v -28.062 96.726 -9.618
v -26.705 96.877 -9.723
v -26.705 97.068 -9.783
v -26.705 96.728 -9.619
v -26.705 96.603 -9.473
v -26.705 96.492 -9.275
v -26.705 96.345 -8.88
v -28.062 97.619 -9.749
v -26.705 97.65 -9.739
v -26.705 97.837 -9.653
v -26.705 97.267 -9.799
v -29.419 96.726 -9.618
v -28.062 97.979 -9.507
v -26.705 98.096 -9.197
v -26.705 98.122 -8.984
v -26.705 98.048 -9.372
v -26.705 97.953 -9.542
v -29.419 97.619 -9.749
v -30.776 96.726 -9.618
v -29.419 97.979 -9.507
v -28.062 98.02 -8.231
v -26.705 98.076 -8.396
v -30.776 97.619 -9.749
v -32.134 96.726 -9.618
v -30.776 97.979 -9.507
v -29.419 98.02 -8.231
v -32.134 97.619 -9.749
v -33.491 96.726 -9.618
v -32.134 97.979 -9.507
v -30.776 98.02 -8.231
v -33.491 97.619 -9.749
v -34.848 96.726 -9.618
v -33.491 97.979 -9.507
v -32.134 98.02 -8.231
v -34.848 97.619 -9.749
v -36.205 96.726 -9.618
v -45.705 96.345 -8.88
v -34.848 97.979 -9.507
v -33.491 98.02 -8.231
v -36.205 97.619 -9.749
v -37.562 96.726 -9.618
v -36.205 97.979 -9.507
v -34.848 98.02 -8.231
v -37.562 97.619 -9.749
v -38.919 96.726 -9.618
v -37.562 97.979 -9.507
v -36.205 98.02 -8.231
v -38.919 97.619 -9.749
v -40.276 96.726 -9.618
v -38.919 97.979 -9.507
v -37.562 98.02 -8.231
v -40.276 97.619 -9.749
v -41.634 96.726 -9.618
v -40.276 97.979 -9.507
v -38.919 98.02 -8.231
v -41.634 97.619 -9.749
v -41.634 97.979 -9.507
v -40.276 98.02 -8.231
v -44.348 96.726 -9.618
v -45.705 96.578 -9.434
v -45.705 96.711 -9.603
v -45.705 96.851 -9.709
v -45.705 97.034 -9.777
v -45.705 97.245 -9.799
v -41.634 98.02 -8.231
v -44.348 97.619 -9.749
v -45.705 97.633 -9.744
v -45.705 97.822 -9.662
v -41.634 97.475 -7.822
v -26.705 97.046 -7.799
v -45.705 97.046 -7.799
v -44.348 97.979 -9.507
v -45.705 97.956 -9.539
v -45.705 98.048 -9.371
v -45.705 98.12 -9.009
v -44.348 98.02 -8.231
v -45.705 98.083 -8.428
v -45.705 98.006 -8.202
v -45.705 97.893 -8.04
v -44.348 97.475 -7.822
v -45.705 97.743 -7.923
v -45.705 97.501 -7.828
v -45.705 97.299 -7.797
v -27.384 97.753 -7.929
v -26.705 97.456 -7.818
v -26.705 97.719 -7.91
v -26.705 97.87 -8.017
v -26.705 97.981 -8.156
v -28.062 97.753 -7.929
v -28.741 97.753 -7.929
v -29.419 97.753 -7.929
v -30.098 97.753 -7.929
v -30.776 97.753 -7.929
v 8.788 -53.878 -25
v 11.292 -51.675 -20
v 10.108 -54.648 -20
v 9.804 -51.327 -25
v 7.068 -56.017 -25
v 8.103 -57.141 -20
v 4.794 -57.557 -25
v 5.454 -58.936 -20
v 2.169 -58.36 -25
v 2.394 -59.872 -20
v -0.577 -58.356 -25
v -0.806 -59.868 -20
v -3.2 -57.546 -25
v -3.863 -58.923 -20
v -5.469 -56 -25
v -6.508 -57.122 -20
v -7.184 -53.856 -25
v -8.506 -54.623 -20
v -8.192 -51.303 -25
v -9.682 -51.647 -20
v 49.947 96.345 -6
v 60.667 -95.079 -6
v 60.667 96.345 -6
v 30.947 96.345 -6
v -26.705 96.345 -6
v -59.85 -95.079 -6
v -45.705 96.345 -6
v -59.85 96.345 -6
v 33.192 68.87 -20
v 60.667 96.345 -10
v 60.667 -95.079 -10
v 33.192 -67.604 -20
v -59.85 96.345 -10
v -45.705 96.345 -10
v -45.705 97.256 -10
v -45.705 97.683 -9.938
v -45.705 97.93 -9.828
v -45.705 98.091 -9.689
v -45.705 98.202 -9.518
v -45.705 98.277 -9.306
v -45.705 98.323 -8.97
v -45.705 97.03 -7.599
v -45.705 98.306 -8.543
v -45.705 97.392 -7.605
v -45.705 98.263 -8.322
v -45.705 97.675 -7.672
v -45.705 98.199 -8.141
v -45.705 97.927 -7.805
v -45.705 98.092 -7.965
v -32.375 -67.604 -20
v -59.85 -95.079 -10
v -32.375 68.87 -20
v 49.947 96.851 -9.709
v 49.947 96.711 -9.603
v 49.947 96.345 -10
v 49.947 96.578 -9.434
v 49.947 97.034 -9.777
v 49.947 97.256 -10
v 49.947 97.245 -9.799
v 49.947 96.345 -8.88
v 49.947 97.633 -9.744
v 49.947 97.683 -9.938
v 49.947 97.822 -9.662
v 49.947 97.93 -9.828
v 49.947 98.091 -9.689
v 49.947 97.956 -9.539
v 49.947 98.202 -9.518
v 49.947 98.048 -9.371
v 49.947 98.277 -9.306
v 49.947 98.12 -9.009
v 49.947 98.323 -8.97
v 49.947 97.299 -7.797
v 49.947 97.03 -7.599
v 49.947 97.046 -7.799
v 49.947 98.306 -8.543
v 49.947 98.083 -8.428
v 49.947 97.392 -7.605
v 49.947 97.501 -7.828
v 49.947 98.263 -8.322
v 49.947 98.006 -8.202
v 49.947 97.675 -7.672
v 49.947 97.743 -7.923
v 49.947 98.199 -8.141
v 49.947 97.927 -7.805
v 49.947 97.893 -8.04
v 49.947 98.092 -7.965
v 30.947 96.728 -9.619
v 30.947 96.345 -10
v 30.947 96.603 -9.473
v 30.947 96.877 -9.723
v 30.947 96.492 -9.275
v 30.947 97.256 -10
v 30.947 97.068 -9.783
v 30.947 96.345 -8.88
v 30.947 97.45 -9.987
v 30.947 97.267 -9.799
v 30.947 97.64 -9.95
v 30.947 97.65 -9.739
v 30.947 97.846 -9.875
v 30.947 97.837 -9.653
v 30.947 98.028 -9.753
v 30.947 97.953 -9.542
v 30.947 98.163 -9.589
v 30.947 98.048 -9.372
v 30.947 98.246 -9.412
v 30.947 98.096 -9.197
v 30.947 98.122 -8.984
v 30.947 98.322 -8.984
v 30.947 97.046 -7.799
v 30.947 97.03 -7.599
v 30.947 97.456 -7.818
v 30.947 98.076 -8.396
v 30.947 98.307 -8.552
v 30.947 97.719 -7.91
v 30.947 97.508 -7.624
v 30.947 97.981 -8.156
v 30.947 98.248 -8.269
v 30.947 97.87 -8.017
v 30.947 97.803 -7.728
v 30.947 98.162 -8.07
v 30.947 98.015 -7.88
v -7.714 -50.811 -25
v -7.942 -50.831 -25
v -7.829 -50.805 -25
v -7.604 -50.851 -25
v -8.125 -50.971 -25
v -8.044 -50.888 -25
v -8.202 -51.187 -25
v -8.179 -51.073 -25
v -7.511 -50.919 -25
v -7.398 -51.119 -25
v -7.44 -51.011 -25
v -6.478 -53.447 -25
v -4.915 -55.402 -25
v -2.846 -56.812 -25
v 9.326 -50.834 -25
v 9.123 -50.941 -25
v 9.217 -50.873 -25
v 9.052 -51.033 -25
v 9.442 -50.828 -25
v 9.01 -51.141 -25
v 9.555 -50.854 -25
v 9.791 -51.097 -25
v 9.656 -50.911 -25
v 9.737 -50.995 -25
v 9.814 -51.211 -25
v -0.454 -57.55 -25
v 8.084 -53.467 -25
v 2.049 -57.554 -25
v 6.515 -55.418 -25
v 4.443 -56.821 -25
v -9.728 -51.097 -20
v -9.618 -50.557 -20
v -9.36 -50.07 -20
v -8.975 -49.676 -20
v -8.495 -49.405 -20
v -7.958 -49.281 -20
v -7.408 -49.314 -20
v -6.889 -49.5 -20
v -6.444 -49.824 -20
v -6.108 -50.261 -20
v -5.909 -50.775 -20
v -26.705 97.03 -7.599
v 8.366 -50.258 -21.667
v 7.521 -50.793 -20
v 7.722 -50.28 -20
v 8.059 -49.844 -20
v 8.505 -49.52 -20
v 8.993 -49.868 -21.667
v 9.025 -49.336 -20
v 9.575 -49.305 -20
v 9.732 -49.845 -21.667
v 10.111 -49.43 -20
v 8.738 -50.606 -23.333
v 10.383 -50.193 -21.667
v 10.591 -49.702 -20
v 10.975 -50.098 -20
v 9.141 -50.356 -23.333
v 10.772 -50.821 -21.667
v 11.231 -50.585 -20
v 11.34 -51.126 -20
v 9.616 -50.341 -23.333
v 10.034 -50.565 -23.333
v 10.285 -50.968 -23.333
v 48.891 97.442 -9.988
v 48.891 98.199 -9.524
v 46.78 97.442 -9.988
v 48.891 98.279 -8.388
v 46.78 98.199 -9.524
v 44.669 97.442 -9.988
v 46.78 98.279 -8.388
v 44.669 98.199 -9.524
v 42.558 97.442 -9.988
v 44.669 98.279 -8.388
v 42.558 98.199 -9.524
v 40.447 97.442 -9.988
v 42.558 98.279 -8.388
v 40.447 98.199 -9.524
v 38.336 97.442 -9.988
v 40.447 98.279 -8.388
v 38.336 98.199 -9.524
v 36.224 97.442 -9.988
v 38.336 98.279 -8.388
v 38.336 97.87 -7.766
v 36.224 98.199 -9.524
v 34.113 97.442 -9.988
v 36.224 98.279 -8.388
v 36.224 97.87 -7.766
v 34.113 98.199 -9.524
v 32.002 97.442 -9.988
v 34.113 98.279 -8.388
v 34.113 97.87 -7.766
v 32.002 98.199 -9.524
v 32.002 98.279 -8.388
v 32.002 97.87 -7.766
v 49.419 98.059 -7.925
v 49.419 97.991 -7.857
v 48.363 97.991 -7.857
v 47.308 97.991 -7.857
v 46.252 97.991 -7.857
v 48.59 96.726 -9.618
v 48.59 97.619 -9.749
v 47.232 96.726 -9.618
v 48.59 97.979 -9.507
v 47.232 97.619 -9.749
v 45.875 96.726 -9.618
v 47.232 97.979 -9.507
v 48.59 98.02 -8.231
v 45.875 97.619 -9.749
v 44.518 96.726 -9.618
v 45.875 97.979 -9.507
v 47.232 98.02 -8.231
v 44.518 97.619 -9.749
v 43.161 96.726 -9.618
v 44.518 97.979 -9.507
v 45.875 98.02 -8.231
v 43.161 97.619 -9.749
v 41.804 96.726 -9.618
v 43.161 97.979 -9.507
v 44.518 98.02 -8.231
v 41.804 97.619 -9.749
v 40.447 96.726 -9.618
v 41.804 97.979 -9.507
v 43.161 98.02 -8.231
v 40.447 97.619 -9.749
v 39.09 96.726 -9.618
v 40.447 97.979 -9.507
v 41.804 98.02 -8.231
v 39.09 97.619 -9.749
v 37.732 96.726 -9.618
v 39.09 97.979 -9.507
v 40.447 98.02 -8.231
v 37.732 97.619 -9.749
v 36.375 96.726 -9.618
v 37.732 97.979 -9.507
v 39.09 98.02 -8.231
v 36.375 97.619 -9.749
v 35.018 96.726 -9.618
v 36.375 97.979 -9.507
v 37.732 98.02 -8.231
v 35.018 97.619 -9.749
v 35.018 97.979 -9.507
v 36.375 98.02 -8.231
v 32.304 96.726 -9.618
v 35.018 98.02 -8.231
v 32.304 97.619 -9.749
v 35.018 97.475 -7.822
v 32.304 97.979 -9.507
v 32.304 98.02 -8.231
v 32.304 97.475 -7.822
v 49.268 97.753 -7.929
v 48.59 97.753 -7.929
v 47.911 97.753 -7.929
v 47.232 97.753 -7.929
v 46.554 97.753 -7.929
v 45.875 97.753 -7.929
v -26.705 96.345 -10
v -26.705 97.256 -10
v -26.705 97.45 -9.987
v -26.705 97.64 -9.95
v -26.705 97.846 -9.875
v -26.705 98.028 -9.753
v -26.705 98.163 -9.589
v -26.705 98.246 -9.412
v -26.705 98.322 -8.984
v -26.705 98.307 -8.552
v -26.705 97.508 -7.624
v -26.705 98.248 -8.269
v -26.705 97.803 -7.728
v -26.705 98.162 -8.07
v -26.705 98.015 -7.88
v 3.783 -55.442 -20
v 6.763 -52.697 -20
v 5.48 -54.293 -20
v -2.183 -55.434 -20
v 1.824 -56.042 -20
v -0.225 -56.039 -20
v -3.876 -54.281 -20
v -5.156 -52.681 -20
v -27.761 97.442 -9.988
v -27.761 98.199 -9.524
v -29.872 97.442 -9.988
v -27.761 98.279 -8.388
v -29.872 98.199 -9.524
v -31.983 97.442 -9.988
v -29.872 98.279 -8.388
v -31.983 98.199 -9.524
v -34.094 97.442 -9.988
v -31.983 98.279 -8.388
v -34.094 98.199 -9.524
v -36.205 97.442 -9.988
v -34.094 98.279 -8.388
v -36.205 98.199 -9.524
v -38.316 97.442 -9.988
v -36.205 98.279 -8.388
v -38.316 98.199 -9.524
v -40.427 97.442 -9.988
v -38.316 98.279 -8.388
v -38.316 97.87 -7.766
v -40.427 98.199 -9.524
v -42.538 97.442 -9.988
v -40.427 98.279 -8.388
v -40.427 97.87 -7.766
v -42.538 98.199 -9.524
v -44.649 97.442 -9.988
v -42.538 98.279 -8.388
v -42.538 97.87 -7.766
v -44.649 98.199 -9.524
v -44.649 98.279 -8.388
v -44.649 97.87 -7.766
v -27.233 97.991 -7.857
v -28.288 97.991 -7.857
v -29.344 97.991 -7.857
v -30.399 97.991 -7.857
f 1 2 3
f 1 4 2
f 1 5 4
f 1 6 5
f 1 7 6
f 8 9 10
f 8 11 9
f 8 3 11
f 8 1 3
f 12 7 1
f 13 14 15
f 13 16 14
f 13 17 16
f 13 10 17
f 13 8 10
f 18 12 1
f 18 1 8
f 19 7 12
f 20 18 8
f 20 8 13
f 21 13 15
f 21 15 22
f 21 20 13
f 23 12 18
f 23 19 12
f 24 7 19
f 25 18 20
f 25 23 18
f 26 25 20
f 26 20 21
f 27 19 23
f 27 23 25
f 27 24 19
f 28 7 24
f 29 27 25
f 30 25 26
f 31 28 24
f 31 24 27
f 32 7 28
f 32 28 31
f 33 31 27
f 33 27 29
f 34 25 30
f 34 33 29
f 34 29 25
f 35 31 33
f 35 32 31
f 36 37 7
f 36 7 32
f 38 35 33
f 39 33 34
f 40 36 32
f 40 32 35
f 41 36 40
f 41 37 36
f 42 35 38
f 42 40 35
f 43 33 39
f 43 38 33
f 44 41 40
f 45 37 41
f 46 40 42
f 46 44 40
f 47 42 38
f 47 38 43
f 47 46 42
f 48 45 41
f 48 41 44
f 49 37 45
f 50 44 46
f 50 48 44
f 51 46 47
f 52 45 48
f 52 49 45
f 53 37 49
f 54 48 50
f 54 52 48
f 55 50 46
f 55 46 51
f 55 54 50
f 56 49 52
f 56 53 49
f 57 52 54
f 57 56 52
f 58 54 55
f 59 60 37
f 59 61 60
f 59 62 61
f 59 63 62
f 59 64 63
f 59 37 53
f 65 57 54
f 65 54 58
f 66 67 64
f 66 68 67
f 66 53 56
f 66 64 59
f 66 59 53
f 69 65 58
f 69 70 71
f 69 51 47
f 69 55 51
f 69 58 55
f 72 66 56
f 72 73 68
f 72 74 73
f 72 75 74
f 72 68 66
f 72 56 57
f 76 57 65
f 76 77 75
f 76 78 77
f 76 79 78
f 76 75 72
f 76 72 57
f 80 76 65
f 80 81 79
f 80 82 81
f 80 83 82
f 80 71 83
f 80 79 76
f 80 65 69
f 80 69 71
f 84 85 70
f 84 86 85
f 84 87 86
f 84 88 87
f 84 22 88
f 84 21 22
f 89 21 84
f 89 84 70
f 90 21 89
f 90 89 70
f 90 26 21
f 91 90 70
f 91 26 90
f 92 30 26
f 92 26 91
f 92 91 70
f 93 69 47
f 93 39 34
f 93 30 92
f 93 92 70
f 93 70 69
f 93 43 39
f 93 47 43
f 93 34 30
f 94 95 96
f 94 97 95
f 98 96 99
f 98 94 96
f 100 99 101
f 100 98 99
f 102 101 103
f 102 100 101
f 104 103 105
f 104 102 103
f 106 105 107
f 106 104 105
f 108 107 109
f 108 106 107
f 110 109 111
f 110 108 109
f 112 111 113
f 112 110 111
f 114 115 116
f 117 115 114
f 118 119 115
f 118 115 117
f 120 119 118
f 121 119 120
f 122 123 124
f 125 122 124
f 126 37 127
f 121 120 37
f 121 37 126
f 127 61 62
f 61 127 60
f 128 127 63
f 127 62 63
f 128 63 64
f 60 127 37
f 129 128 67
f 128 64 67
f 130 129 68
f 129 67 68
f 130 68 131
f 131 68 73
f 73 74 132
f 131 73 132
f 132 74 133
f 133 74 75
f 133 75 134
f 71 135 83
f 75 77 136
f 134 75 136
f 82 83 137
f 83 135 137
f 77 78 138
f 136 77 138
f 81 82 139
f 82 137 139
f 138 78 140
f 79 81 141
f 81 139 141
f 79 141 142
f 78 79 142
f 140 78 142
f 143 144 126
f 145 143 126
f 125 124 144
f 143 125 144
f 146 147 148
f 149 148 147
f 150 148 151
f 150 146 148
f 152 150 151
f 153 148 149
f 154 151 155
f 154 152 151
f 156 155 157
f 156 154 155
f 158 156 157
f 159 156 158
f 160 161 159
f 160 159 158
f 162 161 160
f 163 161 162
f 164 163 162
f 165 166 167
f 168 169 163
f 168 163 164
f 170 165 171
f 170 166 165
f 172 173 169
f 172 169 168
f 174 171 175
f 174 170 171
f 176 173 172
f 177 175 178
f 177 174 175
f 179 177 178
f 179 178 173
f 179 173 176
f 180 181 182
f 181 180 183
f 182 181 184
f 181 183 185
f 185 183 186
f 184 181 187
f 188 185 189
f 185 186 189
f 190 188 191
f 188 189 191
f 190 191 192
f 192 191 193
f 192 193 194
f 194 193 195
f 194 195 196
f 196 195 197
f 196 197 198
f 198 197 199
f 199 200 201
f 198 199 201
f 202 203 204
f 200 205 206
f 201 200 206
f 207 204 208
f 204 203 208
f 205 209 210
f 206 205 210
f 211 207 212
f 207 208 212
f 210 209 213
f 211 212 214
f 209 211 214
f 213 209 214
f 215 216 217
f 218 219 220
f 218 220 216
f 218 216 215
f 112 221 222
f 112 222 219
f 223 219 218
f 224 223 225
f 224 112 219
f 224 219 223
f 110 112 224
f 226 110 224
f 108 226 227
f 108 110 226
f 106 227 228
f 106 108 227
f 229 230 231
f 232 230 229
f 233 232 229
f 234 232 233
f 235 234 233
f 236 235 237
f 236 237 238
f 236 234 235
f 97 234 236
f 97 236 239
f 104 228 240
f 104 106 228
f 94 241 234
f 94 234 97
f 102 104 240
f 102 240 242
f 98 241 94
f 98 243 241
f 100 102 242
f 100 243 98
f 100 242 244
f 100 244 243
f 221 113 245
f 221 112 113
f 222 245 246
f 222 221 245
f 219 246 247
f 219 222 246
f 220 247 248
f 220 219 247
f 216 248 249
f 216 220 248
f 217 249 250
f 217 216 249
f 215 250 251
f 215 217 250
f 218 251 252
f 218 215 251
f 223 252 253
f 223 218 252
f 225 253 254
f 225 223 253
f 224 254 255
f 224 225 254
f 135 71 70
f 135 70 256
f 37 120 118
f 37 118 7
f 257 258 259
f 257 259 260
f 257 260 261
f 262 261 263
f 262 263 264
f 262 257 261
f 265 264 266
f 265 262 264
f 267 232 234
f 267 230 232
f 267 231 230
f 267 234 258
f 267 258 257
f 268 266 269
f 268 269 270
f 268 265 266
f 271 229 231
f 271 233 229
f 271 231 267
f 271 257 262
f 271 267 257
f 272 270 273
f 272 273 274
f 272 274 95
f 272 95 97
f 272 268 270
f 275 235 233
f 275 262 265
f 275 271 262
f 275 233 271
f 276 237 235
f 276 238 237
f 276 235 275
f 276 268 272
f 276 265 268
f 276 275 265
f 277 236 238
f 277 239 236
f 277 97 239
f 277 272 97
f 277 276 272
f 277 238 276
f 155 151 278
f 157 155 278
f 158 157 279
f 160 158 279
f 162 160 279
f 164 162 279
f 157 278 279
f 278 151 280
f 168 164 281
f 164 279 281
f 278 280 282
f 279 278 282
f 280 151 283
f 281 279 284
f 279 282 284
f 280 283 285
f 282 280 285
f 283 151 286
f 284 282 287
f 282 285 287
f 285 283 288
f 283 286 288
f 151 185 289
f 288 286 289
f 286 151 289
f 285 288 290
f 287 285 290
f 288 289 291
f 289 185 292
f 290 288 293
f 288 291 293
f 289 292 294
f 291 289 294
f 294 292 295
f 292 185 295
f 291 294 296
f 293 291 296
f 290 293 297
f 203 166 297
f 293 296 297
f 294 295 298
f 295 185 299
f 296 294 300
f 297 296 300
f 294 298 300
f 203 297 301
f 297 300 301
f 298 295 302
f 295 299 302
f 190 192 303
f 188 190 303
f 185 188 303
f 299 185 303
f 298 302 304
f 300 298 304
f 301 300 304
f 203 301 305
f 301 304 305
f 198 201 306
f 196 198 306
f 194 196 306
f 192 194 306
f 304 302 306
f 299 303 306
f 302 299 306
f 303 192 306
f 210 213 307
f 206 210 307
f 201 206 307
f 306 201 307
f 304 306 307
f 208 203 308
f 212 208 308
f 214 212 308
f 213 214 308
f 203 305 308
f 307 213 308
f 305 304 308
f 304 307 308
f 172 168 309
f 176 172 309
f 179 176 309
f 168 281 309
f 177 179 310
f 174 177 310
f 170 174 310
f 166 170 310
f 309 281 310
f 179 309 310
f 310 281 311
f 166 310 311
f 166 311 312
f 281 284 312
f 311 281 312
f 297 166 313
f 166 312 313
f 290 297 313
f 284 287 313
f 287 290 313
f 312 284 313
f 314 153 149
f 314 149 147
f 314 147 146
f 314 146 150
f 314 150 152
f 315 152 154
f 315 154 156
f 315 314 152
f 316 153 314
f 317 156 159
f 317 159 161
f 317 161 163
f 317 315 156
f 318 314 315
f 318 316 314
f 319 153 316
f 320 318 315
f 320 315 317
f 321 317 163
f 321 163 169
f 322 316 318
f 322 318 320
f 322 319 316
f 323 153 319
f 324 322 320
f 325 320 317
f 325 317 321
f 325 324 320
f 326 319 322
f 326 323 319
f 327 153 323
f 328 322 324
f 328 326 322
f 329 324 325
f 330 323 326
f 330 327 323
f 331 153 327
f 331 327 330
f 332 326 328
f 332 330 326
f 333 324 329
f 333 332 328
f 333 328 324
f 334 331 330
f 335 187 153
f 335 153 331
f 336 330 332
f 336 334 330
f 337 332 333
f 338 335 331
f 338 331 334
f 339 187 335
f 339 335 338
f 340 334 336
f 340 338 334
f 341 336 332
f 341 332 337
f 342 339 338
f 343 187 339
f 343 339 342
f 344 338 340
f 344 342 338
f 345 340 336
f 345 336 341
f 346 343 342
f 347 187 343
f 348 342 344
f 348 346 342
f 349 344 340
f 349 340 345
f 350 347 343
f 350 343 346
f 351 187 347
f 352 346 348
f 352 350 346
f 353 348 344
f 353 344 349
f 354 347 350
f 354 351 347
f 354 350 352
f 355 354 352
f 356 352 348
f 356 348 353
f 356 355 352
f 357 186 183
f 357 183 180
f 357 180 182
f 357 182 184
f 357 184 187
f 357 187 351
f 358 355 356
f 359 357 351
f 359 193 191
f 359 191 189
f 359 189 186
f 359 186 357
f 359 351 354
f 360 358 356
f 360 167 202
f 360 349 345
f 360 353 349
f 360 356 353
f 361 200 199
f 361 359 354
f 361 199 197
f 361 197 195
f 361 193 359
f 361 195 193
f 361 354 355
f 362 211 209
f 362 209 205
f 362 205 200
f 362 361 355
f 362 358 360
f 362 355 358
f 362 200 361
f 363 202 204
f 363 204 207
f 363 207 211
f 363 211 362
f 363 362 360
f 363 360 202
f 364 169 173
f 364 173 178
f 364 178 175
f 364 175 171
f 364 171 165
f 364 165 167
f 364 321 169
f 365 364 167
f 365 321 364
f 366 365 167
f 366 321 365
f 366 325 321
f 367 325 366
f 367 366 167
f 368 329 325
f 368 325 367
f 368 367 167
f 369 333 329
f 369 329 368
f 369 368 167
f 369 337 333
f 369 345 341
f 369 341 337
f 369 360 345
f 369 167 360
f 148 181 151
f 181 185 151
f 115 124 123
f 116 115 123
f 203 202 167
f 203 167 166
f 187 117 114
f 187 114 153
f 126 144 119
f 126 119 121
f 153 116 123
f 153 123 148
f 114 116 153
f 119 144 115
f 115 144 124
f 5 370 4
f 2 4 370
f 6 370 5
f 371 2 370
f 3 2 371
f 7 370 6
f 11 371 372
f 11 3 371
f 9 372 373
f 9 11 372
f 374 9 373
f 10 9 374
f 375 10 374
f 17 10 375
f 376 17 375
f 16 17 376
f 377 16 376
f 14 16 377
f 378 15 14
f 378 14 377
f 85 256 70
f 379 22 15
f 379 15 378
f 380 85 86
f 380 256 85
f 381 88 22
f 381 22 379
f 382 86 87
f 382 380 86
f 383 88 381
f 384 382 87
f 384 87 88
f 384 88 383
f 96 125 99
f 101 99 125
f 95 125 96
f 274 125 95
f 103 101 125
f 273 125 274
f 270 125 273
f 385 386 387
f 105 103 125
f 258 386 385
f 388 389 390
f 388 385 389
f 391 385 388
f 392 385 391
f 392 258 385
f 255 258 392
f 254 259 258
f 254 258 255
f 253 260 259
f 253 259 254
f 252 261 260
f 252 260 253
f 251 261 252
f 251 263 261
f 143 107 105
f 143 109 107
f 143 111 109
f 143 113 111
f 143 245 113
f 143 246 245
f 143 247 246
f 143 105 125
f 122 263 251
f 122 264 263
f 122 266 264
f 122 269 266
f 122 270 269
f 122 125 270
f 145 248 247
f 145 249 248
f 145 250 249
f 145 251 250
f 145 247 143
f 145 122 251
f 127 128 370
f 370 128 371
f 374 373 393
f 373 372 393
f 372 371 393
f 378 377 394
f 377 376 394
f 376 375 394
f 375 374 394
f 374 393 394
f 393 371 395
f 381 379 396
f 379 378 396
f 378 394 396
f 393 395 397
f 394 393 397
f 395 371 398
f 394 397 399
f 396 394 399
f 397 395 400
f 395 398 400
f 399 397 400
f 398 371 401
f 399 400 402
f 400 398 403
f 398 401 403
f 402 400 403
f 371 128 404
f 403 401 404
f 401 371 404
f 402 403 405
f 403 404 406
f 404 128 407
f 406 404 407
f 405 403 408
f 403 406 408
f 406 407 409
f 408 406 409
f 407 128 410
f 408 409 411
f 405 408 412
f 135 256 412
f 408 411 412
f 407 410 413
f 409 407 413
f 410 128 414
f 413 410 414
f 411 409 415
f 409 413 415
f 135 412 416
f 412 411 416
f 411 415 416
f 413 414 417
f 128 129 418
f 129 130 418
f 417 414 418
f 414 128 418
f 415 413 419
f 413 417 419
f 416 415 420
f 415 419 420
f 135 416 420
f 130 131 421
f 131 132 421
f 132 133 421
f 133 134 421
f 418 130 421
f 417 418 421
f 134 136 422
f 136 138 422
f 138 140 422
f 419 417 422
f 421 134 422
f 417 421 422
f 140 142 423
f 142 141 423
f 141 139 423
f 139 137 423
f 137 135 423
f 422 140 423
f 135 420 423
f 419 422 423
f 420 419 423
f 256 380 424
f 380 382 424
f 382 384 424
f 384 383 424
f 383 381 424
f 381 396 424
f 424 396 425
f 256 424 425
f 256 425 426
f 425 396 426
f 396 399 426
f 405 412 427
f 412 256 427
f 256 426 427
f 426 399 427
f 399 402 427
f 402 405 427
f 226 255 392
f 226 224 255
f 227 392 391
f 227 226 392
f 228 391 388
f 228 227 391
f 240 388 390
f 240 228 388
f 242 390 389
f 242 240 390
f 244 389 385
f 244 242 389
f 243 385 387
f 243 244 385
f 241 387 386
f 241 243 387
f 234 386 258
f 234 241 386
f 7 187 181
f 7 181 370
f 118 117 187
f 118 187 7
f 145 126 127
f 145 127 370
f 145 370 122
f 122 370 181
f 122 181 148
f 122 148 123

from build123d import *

# Parameters (mm, degrees)
BOSS_EXTRUDE2_DEPTH      = 5
BOSS_EXTRUDE2_DEPTH_BACK = 10
SKETCH1_W                = 120.517011816
SKETCH1_H                = 193.423301164
CUT_EXTRUDE1_DEPTH       = 117.520998071
CUT_EXTRUDE1_DEPTH_BACK  = 117.520998071
SKETCH2_W                = 10.720124134
SKETCH2_H                = 2
SKETCH2_W_2              = 57.651632978
SKETCH2_W_3              = 14.145254704
CUT_EXTRUDE2_START       = -95.651632978
CUT_EXTRUDE2_DEPTH       = 95.651632978
CUT_EXTRUDE4_DEPTH       = 156.859658163
CUT_EXTRUDE4_DEPTH_BACK  = 156.859658163
SKETCH5_W                = 11
SKETCH5_H                = 191.423301164
BOSS_EXTRUDE3_DEPTH      = 10
BOSS_EXTRUDE3_DRAFT      = 70
BOSS_EXTRUDE4_DEPTH      = 5
BOSS_EXTRUDE4_TAPER      = 17


# Read off the part's stored shape, not the designer's step: Cut-Extrude2
with BuildPart() as part:
    # Sketch1 → Boss-Extrude2 (new, two sides: drawn at the far end of the back side and taken through both)
    with BuildSketch(Plane.XY.offset(-BOSS_EXTRUDE2_DEPTH_BACK)):
        with Locations((0.408269184, 1.633076737)):
            Rectangle(SKETCH1_W, SKETCH1_H)
    extrude(amount=BOSS_EXTRUDE2_DEPTH + BOSS_EXTRUDE2_DEPTH_BACK)

    # Sketch2 → Cut-Extrude1 (cut, two sides: drawn at the far end of the back side and taken through both)
    with BuildSketch(Plane(origin=(0, 0, -10), x_dir=(-1, 0, 0), z_dir=(0, 0, -1)).offset(-CUT_EXTRUDE1_DEPTH_BACK)):
        with Locations((-55.306713025, 97.344727319)):
            Rectangle(SKETCH2_W, SKETCH2_H)
        with Locations((-2.120834469, 97.344727319)):
            Rectangle(SKETCH2_W_2, SKETCH2_H)
        with Locations((52.777609372, 97.344727319)):
            Rectangle(SKETCH2_W_3, SKETCH2_H)
    extrude(amount=CUT_EXTRUDE1_DEPTH + CUT_EXTRUDE1_DEPTH_BACK, mode=Mode.SUBTRACT)

    # Cut-Extrude2 outline → Cut-Extrude2 (cut)
    with BuildSketch(Plane(origin=(49.946650958, 0, 0), x_dir=(0, 0, -1), z_dir=(1, 0, 0)).offset(CUT_EXTRUDE2_START)):
        with BuildLine():
            Line((-5, 96.344727319), (8.880031812, 96.344727322))
            add(Edge.make_bspline(
                [(8.880031812, 96.344727322), (9.017757925, 96.389418818), (9.341148133, 96.502947325), (9.65511797, 96.721266154), (9.834207861, 97.091812499), (9.772304841, 97.682742311), (9.591846004, 97.952667933), (9.299739635, 98.085555426), (8.979382301, 98.13209035), (8.595809552, 98.122046866), (8.280683269, 98.057581679), (8.068335475, 97.930949515), (7.924267823, 97.772346881), (7.828035074, 97.54375556), (7.790578102, 97.292694013), (7.792508646, 97.124503178), (7.79875666, 97.046103501)],
                knots=[0.210157703, 0.210157703, 0.210157703, 0.210157703, 0.25, 0.3125, 0.375, 0.5, 0.625, 0.6875, 0.75, 0.8125, 0.875, 0.90625, 0.9375, 0.96875, 0.984375, 1, 1, 1, 1], degree=3))
            Line((7.79875666, 97.046103501), (7.599388771, 97.030214998))
            add(Edge.make_bspline(
                [(10, 97.255513039), (9.999998961, 97.447527895), (9.972419046, 97.629851143), (9.927722494, 97.794553197), (9.870710413, 97.937325839), (9.798783484, 98.058137149), (9.704435395, 98.159491912), (9.580897677, 98.243174202), (9.426924325, 98.307669655), (9.246866395, 98.348516931), (9.047009529, 98.36212633), (8.833423752, 98.351560976), (8.612813999, 98.330782958), (8.391619774, 98.318858897), (8.17208277, 98.31353746), (7.941741695, 98.247701653), (7.690138593, 98.003146143), (7.552784018, 97.615008356), (7.599388771, 97.030214998)],
                knots=[0.42378525, 0.42378525, 0.42378525, 0.42378525, 0.42378525, 0.42378525, 0.42378525, 0.42378525, 0.42378525, 0.42378525, 0.42378525, 0.42378525, 0.42378525, 0.42378525, 0.42378525, 0.42378525, 0.42378525, 0.42378525, 0.42378525, 1, 1, 1, 1, 1, 1, 1, 1, 1, 1, 1, 1, 1, 1, 1, 1, 1, 1, 1], degree=18))
            Line((10, 97.255513039), (10, 98.344727319))
            Line((10, 98.344727319), (-5, 98.344727319))
            Line((-5, 98.344727319), (-5, 96.344727319))
        make_face()
    extrude(amount=CUT_EXTRUDE2_DEPTH, mode=Mode.SUBTRACT)

    # Sketch5 → Cut-Extrude4 (cut, two sides: drawn at the far end of the back side and taken through both)
    with BuildSketch(Plane(origin=(60.666775092, 0, 0), x_dir=(0, 0, -1), z_dir=(1, 0, 0)).offset(-CUT_EXTRUDE4_DEPTH_BACK)):
        with Locations((0.5, 0.633076737)):
            Rectangle(SKETCH5_W, SKETCH5_H)
    extrude(amount=CUT_EXTRUDE4_DEPTH + CUT_EXTRUDE4_DEPTH_BACK, mode=Mode.SUBTRACT)


with BuildPart() as boss_extrude3_tool:
    # Sketch6 → Boss-Extrude3 (with draft: the straight prism first)
    with BuildSketch(Plane(origin=(0, 0, -10), x_dir=(-1, 0, 0), z_dir=(0, 0, -1))):
        Polygon((-49.946650958, 96.344727319), (-60.666775092, 96.344727319), (-60.666775092, -95.078573845), (59.850236724, -95.078573845), (59.850236724, 96.344727319), (45.70498202, 96.344727319), (26.70498202, 96.344727319), (-30.946650958, 96.344727319), align=None)
    extrude(amount=BOSS_EXTRUDE3_DEPTH)
    # Boss-Extrude3: the draft: its side faces are tilted about the plane it starts from
    boss_extrude3_sides = [boss_extrude3_tool.faces().sort_by_distance(p)[0] for p in [
        (0.408269184, 96.344727319, -15),
        (60.666775092, 0.633076737, -15),
        (0.408269184, -95.078573845, -15),
        (-59.850236724, 0.633076737, -15),
    ]]
    draft(boss_extrude3_sides, Plane(origin=(0, 0, -10), x_dir=(-1, 0, 0), z_dir=(0, 0, -1)), BOSS_EXTRUDE3_DRAFT)


with BuildPart() as part_1:
    add(part.part)

    # Boss-Extrude3: add boss_extrude3_tool
    add(boss_extrude3_tool.part)

    # Sketch7 → Boss-Extrude4 (add)
    with BuildSketch(Plane(origin=(0, 0, -20), x_dir=(-1, 0, 0), z_dir=(0, 0, -1))):
        with BuildLine():
            ThreePointArc((-11.292084394, -51.674806102), (-0.79402055, -59.989504928), (9.681667321, -51.646632242))
            ThreePointArc((9.681667321, -51.646632242), (8.230968391, -49.324207989), (5.908544137, -50.774906919))
            ThreePointArc((5.908544137, -50.774906919), (-0.79922246, -56.116994562), (-7.521316785, -50.792947135))
            ThreePointArc((-7.521316785, -50.792947135), (-9.847630073, -49.348492814), (-11.292084394, -51.674806102))
        make_face()
    extrude(amount=BOSS_EXTRUDE4_DEPTH, taper=BOSS_EXTRUDE4_TAPER)


solid = part_1.part
